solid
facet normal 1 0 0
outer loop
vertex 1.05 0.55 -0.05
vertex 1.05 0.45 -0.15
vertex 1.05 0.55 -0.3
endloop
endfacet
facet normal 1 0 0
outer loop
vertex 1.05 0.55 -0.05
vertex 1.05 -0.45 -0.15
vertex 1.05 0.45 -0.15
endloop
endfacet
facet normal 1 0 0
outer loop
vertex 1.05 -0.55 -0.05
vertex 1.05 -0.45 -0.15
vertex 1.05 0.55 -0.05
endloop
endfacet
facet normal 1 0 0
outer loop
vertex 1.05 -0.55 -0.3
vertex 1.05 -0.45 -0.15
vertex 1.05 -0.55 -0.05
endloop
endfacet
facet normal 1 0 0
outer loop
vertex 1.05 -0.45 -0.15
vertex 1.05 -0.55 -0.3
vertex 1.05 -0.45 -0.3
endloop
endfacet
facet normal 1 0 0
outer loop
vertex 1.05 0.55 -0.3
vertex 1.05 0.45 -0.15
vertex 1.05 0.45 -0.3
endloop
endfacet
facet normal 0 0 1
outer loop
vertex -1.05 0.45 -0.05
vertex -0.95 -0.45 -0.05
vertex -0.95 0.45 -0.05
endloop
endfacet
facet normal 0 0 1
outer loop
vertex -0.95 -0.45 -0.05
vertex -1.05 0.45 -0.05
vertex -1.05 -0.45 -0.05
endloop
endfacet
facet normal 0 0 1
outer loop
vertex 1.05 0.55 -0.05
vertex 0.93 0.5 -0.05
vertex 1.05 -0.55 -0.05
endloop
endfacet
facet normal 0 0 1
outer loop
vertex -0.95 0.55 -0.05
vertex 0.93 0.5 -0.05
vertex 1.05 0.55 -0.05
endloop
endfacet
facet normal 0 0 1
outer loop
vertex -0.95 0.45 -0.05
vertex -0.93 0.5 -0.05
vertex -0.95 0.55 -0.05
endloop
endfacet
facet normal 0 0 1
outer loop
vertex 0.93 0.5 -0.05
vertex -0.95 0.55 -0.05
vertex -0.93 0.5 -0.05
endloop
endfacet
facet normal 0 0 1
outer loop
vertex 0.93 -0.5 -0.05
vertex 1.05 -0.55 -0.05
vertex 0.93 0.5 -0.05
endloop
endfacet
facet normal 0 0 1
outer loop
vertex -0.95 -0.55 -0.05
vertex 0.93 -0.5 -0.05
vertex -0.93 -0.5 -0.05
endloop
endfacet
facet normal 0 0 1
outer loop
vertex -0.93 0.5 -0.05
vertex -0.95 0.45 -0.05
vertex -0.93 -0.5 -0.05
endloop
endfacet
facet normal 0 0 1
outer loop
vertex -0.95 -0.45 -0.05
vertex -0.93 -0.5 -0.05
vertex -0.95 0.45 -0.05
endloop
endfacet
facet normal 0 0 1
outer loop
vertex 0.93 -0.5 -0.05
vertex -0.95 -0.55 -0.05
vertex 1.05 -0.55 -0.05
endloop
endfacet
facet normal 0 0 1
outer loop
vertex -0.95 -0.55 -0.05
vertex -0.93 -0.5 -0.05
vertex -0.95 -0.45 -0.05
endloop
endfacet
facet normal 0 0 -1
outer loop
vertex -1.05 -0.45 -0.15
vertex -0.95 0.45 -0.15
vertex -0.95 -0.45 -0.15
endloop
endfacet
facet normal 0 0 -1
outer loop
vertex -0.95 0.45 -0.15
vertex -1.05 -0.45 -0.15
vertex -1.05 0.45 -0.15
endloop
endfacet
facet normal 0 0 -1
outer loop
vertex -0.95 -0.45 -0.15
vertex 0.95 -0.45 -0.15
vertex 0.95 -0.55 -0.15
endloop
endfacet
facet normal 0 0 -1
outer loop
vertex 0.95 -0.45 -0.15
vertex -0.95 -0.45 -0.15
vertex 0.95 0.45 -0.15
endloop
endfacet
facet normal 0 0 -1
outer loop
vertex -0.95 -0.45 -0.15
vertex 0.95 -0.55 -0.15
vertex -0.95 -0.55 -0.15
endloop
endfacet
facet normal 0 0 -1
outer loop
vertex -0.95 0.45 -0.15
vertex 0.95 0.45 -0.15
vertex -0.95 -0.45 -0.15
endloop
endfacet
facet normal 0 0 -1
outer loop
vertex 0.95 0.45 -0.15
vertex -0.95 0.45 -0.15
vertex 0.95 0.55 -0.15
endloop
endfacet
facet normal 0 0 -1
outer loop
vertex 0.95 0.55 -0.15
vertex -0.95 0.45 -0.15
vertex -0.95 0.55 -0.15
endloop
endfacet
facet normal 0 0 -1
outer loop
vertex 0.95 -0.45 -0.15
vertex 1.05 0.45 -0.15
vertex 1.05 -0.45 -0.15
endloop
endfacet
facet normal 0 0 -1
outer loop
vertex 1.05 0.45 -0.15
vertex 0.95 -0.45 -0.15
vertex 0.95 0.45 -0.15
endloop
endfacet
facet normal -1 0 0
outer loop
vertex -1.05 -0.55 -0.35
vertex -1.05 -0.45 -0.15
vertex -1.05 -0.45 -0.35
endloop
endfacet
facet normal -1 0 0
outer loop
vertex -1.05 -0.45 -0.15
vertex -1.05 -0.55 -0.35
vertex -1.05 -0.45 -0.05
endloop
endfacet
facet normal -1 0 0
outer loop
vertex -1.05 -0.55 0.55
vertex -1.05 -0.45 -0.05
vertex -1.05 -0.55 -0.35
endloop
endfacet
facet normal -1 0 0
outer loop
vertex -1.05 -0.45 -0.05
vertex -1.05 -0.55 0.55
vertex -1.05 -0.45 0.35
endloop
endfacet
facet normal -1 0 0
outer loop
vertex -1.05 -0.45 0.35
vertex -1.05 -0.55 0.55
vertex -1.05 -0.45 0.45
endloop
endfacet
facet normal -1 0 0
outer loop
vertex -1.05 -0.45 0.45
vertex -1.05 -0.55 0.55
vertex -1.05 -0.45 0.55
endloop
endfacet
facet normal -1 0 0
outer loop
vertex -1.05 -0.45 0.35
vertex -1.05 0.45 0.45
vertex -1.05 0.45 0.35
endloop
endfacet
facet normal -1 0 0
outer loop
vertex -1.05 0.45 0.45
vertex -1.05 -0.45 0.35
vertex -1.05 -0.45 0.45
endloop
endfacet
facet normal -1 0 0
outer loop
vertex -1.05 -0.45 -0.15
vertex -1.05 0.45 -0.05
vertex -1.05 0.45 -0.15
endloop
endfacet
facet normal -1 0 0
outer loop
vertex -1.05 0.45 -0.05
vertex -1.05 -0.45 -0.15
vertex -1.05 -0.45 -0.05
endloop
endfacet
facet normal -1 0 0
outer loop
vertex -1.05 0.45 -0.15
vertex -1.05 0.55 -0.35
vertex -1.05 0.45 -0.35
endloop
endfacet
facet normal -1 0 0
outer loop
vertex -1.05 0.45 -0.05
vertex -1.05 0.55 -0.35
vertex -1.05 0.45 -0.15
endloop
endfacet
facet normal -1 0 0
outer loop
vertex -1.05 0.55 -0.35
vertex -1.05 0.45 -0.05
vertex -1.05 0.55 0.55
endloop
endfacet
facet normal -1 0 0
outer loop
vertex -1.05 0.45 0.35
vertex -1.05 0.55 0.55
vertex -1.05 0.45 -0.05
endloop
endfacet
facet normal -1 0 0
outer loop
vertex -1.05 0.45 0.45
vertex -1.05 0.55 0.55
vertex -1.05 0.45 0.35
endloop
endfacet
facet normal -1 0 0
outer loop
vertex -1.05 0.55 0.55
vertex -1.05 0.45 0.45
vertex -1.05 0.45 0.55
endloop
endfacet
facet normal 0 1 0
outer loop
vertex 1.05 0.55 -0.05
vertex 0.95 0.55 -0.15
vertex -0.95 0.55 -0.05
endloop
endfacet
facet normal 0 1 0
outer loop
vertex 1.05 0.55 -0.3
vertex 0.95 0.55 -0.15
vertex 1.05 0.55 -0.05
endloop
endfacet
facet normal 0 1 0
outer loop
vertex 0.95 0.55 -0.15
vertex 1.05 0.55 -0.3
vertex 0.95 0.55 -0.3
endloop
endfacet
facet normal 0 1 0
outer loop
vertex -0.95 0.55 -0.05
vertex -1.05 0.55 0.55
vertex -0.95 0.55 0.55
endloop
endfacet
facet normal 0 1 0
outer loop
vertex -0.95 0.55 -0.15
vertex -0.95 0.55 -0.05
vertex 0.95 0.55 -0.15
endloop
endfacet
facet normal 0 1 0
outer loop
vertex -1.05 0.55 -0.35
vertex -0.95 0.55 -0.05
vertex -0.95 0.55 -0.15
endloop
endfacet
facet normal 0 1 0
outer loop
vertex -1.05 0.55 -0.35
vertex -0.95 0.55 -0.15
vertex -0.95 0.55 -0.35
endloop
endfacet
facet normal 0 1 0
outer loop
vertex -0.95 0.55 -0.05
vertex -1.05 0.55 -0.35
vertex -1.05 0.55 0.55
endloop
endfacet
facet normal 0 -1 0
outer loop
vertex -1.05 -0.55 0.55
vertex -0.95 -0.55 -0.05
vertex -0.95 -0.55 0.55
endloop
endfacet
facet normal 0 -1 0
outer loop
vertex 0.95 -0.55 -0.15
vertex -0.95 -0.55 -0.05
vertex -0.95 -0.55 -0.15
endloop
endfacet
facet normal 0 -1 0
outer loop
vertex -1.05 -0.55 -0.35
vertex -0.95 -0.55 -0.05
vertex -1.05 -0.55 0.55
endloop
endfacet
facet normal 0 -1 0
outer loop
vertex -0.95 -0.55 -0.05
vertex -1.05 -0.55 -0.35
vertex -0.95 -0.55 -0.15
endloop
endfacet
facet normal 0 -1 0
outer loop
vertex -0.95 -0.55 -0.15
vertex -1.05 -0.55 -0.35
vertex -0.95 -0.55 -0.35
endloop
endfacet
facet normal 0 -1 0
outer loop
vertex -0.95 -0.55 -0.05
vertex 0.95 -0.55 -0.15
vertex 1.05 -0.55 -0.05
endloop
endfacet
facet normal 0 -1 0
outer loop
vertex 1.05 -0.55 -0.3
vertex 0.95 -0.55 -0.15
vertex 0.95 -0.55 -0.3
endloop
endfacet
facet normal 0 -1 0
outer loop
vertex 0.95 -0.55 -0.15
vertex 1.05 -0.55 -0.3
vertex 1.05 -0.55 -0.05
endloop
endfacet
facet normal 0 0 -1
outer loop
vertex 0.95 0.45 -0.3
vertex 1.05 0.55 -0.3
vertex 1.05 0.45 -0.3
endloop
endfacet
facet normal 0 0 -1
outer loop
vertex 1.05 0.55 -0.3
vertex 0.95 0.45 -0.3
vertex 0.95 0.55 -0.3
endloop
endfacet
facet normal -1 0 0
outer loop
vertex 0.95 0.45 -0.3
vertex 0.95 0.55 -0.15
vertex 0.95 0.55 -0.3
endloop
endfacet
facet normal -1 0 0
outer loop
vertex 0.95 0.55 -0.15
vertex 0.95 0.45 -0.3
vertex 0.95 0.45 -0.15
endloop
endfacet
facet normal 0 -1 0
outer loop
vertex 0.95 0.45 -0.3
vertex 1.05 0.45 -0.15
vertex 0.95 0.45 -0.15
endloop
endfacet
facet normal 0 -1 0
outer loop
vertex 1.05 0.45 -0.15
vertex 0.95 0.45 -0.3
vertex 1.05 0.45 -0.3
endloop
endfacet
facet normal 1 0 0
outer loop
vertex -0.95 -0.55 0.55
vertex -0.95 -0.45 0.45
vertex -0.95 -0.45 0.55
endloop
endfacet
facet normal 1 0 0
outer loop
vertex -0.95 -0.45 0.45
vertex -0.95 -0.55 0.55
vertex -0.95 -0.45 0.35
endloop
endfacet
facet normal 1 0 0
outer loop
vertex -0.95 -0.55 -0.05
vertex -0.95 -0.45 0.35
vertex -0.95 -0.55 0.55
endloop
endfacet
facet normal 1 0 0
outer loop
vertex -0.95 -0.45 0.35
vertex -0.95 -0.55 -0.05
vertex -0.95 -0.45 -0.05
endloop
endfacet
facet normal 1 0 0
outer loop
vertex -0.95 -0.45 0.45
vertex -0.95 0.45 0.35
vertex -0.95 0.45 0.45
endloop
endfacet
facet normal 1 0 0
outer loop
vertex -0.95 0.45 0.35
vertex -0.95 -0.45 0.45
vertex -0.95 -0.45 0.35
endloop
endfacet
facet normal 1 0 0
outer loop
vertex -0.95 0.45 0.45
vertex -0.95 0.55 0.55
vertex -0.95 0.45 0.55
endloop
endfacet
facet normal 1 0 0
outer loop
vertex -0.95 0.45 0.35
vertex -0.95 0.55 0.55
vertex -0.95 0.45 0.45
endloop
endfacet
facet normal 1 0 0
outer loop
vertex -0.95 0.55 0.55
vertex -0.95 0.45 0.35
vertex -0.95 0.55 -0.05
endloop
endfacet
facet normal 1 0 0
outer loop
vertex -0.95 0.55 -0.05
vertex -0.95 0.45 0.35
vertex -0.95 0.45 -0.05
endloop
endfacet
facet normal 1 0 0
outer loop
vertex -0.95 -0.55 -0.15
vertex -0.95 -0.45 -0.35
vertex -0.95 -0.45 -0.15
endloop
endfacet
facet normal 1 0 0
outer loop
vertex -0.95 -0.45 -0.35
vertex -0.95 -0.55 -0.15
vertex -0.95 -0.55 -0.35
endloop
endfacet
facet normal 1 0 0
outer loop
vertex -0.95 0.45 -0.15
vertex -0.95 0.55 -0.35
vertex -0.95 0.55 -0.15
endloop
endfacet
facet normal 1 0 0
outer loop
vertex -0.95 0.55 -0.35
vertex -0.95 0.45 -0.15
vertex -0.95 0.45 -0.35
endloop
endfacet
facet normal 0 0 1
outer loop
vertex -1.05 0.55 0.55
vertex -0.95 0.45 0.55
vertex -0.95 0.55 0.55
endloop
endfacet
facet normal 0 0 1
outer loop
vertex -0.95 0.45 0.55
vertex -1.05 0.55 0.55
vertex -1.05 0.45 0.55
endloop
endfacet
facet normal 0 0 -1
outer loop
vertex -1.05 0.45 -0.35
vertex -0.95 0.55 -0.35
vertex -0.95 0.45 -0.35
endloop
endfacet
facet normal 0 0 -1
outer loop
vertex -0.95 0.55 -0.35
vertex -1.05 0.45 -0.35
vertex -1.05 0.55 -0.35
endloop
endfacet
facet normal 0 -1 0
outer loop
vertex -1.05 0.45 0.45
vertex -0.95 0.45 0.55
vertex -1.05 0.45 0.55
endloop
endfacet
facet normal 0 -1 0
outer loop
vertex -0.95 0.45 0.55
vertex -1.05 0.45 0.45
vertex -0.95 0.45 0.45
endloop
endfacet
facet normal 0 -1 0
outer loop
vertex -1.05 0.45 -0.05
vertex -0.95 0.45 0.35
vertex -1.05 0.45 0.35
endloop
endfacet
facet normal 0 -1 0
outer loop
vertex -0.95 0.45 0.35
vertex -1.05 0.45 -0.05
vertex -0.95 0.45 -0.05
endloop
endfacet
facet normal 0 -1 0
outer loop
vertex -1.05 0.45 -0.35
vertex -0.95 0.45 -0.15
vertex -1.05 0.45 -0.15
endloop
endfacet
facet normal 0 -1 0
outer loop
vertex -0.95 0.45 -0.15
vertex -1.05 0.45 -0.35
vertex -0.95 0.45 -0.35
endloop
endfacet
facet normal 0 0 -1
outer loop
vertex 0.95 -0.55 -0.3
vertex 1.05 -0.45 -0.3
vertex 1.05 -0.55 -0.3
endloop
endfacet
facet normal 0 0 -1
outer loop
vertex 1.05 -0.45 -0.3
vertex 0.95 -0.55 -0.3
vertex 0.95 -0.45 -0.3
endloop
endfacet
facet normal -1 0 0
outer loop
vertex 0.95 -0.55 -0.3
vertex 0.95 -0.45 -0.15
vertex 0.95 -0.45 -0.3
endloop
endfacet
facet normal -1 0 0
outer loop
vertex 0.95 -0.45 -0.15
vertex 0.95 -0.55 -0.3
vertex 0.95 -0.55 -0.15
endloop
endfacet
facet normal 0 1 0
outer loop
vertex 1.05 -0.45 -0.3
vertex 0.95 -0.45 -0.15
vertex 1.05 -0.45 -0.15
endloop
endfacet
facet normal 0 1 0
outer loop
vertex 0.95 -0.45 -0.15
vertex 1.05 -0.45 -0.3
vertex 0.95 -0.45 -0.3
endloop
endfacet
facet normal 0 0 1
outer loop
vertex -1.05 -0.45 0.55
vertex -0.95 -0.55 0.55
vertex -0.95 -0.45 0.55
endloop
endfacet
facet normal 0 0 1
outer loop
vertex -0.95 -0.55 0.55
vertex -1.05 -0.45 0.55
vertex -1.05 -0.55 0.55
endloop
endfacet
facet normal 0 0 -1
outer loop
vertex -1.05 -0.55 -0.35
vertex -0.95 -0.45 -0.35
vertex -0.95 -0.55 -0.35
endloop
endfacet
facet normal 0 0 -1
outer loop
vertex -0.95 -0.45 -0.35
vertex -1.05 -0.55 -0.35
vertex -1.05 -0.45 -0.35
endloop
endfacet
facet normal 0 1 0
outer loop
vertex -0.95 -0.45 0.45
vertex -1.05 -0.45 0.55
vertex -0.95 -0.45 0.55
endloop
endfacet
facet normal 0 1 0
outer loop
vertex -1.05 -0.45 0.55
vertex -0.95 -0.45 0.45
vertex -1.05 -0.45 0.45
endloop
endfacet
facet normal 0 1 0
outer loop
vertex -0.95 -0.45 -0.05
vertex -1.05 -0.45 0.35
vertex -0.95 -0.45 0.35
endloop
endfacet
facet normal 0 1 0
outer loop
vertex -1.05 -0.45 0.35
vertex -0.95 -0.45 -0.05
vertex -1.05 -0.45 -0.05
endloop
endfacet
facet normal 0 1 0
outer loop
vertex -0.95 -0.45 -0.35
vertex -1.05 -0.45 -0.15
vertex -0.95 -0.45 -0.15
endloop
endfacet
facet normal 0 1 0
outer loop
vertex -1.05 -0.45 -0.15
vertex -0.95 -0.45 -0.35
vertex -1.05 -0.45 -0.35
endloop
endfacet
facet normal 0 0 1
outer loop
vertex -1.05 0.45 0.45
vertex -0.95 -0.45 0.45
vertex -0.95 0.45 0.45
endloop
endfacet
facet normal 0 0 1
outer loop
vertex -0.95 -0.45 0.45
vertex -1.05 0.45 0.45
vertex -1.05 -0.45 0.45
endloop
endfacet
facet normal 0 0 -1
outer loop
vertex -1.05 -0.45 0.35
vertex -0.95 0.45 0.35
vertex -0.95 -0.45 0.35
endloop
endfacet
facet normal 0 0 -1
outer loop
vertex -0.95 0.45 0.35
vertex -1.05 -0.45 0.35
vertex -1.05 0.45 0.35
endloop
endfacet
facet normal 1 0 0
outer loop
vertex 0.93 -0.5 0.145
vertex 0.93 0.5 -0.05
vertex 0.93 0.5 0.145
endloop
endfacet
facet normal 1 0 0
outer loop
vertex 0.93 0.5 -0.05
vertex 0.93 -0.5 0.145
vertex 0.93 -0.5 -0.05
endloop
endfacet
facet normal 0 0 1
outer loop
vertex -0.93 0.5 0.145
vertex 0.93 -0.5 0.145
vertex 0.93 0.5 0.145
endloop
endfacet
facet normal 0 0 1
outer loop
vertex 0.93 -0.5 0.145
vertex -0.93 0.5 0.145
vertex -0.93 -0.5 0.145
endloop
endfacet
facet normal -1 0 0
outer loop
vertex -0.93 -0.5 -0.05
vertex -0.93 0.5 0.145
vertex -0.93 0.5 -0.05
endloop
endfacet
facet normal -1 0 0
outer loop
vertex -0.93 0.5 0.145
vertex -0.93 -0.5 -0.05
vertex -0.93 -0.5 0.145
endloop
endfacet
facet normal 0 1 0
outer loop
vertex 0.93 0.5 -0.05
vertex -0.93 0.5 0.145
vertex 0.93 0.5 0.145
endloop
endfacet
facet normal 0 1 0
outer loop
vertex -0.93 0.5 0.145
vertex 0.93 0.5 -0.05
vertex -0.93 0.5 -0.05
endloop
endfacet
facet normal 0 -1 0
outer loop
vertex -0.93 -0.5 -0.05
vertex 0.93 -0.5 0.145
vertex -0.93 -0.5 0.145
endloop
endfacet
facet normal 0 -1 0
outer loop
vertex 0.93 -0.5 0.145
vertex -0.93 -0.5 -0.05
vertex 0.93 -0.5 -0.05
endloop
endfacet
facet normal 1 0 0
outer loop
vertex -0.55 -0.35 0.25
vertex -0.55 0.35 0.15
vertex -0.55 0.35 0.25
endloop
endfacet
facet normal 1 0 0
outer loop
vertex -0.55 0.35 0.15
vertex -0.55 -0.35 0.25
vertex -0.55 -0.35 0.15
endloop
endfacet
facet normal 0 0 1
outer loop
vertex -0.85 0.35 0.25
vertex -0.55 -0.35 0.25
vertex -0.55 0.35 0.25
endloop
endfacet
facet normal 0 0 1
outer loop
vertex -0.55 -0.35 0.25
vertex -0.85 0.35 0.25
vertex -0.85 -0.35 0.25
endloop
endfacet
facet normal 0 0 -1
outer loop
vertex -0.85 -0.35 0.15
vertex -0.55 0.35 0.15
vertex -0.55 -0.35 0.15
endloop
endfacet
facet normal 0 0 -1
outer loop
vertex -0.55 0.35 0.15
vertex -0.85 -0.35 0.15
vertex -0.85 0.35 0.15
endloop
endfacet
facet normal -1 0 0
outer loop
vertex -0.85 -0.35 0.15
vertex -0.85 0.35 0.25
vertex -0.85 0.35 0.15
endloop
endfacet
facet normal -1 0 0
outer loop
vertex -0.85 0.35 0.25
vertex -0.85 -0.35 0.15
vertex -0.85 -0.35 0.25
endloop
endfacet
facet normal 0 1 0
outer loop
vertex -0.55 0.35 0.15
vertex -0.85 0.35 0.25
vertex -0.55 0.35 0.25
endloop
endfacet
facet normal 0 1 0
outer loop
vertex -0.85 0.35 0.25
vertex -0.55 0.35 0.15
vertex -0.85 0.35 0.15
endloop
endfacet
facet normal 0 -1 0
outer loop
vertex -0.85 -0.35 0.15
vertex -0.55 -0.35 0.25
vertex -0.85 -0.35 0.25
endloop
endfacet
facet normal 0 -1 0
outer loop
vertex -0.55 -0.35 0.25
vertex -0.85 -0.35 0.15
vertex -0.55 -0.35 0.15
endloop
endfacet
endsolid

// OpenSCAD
module Bed_01(){

    color("#badbed")
    cube([1.86,1,0.29], center = true);

    color("#cdaa7d"){
        translate([0,0,-0.1])
        cube([2.1,1.1,0.1], center = true);

        translate([1,0.5,-0.2])
        cube([0.1,0.1,0.2], center = true);

        translate([-1,0.5,0.1])
        cube([0.1,0.1,0.9], center = true);

        translate([1,-0.5,-0.2])
        cube([0.1,0.1,0.2], center = true);

        translate([-1,-0.5,0.1])
        cube([0.1,0.1,0.9], center = true);

        translate([-1,0,0.4])
        cube([0.1,0.9,0.1], center = true);
    }

    color("white"){
        translate([-0.7,0,0.2])
        cube([0.3,0.7,0.1], center = true);
    }

}

Bed_01();


// Written by Nicolì Angelo (Gengio) 2024: 
// MIT License


//Permission is hereby granted, free of charge, to any person obtaining a copy of this software and associated documentation files (the "Software"), to deal in the Software without restriction, including without limitation the rights to use, copy, modify, merge, publish, distribute, sublicense, and/or sell copies of the Software, and to permit persons to whom the Software is furnished to do so, subject to the following conditions:

//The above copyright notice and this permission notice shall be included in all copies or substantial portions of the Software.

//THE SOFTWARE IS PROVIDED "AS IS", WITHOUT WARRANTY OF ANY KIND, EXPRESS OR IMPLIED, INCLUDING BUT NOT LIMITED TO THE WARRANTIES OF MERCHANTABILITY, FITNESS FOR A PARTICULAR PURPOSE AND NONINFRINGEMENT. IN NO EVENT SHALL THE AUTHORS OR COPYRIGHT HOLDERS BE LIABLE FOR ANY CLAIM, DAMAGES OR OTHER LIABILITY, WHETHER IN AN ACTION OF CONTRACT, TORT OR OTHERWISE, ARISING FROM, OUT OF OR IN CONNECTION WITH THE SOFTWARE OR THE USE OR OTHER DEALINGS IN THE SOFTWARE.
